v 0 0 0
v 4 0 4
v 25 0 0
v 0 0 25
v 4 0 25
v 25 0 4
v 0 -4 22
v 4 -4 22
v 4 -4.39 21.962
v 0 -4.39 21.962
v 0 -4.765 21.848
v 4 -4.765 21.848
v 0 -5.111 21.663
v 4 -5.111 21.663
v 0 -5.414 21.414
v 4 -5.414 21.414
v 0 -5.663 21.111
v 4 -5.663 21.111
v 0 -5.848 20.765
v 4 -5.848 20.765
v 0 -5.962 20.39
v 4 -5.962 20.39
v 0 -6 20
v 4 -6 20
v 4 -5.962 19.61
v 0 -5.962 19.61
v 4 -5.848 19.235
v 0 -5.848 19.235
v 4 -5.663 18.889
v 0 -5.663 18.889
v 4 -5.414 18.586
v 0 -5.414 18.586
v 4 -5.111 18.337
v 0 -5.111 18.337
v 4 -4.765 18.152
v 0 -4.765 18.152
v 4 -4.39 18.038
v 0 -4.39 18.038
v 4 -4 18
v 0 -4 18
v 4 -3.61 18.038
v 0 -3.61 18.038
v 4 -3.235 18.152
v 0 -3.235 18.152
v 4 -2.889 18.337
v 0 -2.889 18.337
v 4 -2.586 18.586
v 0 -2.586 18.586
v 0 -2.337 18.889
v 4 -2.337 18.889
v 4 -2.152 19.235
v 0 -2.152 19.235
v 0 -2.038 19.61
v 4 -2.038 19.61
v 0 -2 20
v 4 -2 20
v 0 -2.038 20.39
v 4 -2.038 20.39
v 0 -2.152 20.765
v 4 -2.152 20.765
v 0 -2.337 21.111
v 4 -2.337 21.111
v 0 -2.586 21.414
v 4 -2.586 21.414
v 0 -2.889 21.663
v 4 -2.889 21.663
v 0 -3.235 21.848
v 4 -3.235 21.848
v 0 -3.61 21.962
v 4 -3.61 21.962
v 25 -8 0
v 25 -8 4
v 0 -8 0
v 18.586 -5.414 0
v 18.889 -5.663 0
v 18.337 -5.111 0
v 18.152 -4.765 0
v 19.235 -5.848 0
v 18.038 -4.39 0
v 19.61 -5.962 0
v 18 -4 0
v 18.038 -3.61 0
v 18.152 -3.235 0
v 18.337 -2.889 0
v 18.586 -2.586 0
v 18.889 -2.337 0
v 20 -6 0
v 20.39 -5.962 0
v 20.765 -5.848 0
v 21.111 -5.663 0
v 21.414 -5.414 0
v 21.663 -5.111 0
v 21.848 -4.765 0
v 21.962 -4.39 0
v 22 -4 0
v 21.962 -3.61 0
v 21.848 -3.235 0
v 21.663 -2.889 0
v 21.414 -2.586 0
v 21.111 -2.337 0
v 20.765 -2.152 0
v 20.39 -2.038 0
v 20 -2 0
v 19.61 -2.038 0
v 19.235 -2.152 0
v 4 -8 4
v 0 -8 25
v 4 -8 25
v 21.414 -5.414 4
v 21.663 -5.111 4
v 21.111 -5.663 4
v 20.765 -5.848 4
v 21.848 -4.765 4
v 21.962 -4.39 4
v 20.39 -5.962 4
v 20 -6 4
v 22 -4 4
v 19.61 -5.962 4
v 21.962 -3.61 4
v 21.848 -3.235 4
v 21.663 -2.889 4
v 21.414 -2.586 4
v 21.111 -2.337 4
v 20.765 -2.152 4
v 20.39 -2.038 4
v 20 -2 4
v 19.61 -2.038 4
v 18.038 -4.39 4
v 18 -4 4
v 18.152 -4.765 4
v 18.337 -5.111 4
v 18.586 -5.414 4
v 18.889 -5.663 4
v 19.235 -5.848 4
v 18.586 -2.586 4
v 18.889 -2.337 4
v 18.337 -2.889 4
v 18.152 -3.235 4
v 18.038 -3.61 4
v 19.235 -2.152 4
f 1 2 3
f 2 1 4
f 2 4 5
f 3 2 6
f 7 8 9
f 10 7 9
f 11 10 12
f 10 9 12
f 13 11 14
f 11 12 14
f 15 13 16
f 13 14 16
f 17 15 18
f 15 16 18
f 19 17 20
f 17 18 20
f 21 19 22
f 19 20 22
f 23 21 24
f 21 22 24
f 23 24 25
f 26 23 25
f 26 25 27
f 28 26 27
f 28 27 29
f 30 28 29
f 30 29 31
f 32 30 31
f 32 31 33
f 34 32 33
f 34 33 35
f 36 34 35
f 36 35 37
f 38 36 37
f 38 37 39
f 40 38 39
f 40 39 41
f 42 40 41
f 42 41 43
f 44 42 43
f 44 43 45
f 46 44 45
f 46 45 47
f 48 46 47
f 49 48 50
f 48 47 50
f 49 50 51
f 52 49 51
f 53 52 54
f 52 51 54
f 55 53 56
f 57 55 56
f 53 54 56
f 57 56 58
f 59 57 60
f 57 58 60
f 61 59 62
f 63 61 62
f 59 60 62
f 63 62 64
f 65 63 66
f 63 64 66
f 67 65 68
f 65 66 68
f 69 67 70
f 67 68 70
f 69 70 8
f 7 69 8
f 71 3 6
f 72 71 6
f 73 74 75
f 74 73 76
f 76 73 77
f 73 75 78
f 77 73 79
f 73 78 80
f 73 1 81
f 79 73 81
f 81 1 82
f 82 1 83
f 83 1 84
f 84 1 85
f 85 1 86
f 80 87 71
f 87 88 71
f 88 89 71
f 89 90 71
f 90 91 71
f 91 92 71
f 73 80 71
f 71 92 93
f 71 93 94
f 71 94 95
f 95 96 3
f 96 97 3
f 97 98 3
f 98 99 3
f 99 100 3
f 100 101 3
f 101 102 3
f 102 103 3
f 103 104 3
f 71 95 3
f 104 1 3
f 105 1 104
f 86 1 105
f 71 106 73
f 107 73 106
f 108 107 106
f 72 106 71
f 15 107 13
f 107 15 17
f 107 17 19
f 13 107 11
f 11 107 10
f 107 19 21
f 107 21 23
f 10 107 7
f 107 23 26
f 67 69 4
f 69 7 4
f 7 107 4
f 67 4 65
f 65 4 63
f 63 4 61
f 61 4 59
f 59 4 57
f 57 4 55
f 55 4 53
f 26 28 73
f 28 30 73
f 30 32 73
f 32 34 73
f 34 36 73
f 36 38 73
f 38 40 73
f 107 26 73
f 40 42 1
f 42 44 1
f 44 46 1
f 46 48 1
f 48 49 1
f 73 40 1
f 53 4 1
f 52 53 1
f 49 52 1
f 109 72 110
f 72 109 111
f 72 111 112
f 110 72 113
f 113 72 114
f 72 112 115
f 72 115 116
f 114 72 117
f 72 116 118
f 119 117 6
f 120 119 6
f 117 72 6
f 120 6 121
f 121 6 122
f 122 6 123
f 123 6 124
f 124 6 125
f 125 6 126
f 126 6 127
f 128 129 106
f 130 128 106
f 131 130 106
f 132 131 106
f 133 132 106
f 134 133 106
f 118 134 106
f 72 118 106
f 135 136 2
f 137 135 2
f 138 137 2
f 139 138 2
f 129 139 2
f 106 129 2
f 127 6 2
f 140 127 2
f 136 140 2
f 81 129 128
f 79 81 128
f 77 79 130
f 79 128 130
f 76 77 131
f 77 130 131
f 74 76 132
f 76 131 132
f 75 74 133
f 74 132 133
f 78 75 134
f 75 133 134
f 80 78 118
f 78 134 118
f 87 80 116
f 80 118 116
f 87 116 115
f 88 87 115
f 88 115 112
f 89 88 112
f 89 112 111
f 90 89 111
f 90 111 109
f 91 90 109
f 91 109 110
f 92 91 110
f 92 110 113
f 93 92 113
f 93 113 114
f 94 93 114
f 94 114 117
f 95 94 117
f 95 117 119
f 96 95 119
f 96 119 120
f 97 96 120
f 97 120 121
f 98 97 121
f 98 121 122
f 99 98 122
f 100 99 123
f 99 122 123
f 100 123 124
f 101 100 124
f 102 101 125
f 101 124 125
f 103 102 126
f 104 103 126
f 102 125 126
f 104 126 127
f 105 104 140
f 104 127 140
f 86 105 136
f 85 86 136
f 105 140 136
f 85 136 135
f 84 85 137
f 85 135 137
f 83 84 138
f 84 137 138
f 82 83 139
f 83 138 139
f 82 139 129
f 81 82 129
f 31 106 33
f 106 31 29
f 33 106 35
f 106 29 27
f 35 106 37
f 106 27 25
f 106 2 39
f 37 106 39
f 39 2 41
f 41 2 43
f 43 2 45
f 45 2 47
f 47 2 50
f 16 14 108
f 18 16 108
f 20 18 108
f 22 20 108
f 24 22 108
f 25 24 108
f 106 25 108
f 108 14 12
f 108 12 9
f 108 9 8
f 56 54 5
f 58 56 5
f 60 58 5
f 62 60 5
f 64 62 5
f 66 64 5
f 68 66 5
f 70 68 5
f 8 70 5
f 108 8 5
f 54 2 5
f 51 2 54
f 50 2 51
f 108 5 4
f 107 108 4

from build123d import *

# Parameters (mm, degrees)
PAD_DEPTH       = 8
SKETCH001_R     = 2
POCKET_DEPTH    = 5
SKETCH002_R     = 2
POCKET001_DEPTH = 5


with BuildPart() as part:
    # Sketch → Pad (new body)
    with BuildSketch(Plane.XZ):
        Polygon((4, 4), (4, 25), (0, 25), (0, 0), (25, 0), (25, 4), align=None)
    extrude(amount=PAD_DEPTH)

    # Sketch001 (on Face6 of Pad) → Pocket (cut)
    with BuildSketch(Plane(origin=(0, 0, 4), x_dir=(-1, 0, 0), z_dir=(0, 0, 1))):
        with Locations((-20, 4)):
            Circle(SKETCH001_R)
    extrude(amount=-POCKET_DEPTH, mode=Mode.SUBTRACT)

    # Sketch002 (on Face1 of Pocket) → Pocket001 (cut)
    with BuildSketch(Plane(origin=(4, 0, 0), x_dir=(0, 0, 1), z_dir=(1, 0, 0))):
        with Locations((20, 4)):
            Circle(SKETCH002_R)
    extrude(amount=-POCKET001_DEPTH, mode=Mode.SUBTRACT)


solid = part.part
